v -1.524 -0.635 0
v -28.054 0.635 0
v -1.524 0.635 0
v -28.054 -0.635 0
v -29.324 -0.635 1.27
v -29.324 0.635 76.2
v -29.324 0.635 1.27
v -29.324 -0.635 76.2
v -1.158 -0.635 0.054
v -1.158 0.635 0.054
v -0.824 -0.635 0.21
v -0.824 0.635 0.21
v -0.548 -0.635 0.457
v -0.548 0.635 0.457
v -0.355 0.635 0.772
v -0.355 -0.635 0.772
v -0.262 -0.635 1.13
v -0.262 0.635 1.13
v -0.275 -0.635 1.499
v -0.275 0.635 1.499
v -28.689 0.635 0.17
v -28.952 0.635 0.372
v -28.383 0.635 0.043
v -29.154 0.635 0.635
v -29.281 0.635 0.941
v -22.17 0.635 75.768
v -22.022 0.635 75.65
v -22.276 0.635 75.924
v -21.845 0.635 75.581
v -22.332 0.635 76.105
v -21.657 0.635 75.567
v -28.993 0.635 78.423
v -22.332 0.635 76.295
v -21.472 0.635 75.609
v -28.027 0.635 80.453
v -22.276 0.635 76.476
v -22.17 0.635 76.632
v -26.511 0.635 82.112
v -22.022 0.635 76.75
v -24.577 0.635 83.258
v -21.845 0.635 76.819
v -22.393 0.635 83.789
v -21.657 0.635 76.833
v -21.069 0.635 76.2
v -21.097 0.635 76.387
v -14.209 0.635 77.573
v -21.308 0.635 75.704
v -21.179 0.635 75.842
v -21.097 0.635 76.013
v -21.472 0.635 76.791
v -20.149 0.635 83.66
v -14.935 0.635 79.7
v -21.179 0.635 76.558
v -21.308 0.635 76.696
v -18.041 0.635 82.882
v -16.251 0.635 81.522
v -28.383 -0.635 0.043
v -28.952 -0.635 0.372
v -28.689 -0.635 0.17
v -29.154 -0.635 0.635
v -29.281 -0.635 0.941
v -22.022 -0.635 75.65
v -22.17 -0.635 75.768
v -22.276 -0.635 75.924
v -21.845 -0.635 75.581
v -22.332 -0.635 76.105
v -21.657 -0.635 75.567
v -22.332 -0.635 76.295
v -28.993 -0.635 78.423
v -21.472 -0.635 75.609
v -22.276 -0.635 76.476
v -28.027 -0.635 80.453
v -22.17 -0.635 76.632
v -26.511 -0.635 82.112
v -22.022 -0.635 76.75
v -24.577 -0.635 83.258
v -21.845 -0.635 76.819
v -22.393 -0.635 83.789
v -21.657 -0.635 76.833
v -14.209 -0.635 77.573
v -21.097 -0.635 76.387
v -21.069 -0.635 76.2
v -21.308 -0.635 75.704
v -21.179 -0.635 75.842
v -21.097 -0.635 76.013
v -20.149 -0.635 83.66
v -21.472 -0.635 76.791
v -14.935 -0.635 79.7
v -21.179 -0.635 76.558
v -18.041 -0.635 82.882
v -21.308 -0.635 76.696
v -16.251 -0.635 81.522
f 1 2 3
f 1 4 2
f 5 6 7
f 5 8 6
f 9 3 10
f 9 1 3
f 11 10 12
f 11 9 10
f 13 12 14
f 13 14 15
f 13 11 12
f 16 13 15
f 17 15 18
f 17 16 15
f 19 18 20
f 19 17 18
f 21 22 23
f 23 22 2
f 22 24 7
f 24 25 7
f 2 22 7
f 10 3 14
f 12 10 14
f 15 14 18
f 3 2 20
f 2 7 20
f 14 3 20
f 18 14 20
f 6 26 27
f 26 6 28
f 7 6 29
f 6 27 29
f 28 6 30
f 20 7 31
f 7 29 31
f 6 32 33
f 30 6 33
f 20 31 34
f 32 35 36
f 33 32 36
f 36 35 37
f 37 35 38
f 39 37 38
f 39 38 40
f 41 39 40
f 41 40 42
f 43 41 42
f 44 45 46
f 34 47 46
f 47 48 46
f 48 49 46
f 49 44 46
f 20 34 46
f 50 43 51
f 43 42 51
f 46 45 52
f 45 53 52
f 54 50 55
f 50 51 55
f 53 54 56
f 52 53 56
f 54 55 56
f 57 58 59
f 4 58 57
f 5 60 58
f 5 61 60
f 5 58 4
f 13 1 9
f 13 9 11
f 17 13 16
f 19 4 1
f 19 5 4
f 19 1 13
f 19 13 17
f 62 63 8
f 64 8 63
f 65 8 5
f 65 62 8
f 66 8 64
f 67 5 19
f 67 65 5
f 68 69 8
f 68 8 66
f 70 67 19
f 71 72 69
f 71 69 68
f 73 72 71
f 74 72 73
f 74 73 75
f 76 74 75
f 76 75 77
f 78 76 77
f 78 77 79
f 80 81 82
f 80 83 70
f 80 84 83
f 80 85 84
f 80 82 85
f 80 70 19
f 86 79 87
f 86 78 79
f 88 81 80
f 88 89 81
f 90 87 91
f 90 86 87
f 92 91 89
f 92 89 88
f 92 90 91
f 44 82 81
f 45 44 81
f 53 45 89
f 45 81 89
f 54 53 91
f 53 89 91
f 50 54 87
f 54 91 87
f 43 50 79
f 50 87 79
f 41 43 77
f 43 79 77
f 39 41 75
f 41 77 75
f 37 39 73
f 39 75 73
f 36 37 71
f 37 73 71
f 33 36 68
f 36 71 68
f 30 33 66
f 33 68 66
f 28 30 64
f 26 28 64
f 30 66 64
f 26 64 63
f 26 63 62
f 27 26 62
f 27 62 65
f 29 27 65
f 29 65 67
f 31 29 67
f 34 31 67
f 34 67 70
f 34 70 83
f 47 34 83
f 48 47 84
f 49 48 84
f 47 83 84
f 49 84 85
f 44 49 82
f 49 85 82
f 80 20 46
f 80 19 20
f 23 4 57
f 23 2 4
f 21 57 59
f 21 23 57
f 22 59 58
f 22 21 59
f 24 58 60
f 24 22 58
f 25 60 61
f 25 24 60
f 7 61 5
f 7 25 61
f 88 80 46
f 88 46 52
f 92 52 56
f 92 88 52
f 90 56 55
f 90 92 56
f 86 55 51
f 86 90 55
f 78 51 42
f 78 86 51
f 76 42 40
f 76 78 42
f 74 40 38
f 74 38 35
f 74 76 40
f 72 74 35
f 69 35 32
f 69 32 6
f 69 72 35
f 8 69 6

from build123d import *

# Parameters (mm, degrees)
F1_DEPTH = 0.635
F2_R     = 0.635
F3_DEPTH = 1.27
F4_R     = 1.27


with BuildPart() as f1:
    # F0 (on Front) → F1 (new body, symmetric)
    with BuildSketch(Plane.XZ):
        with BuildLine():
            Line((-29.324013, 0), (0, 0))
            Line((0, 0), (-14.208709, 77.572884))
            ThreePointArc((-14.208709, 77.572884), (-22.393281, 83.788762), (-29.324013, 76.2))
            Line((-29.324013, 76.2), (-29.324013, 0))
        make_face()
    extrude(amount=F1_DEPTH, both=True)

    # F2 (on face) → F3 (cut, through all)
    with BuildSketch(Plane.XZ.offset(0.635)):
        with Locations((-21.704013, 76.2)):
            Circle(F2_R)
    extrude(amount=-F3_DEPTH, mode=Mode.SUBTRACT)

    # F4
    f4_edges = [f1.edges().sort_by_distance(p)[0] for p in [
        (-29.324013, 0, 0),
        (0, 0, 0),
    ]]
    fillet(f4_edges, radius=F4_R)


solid = f1.part
